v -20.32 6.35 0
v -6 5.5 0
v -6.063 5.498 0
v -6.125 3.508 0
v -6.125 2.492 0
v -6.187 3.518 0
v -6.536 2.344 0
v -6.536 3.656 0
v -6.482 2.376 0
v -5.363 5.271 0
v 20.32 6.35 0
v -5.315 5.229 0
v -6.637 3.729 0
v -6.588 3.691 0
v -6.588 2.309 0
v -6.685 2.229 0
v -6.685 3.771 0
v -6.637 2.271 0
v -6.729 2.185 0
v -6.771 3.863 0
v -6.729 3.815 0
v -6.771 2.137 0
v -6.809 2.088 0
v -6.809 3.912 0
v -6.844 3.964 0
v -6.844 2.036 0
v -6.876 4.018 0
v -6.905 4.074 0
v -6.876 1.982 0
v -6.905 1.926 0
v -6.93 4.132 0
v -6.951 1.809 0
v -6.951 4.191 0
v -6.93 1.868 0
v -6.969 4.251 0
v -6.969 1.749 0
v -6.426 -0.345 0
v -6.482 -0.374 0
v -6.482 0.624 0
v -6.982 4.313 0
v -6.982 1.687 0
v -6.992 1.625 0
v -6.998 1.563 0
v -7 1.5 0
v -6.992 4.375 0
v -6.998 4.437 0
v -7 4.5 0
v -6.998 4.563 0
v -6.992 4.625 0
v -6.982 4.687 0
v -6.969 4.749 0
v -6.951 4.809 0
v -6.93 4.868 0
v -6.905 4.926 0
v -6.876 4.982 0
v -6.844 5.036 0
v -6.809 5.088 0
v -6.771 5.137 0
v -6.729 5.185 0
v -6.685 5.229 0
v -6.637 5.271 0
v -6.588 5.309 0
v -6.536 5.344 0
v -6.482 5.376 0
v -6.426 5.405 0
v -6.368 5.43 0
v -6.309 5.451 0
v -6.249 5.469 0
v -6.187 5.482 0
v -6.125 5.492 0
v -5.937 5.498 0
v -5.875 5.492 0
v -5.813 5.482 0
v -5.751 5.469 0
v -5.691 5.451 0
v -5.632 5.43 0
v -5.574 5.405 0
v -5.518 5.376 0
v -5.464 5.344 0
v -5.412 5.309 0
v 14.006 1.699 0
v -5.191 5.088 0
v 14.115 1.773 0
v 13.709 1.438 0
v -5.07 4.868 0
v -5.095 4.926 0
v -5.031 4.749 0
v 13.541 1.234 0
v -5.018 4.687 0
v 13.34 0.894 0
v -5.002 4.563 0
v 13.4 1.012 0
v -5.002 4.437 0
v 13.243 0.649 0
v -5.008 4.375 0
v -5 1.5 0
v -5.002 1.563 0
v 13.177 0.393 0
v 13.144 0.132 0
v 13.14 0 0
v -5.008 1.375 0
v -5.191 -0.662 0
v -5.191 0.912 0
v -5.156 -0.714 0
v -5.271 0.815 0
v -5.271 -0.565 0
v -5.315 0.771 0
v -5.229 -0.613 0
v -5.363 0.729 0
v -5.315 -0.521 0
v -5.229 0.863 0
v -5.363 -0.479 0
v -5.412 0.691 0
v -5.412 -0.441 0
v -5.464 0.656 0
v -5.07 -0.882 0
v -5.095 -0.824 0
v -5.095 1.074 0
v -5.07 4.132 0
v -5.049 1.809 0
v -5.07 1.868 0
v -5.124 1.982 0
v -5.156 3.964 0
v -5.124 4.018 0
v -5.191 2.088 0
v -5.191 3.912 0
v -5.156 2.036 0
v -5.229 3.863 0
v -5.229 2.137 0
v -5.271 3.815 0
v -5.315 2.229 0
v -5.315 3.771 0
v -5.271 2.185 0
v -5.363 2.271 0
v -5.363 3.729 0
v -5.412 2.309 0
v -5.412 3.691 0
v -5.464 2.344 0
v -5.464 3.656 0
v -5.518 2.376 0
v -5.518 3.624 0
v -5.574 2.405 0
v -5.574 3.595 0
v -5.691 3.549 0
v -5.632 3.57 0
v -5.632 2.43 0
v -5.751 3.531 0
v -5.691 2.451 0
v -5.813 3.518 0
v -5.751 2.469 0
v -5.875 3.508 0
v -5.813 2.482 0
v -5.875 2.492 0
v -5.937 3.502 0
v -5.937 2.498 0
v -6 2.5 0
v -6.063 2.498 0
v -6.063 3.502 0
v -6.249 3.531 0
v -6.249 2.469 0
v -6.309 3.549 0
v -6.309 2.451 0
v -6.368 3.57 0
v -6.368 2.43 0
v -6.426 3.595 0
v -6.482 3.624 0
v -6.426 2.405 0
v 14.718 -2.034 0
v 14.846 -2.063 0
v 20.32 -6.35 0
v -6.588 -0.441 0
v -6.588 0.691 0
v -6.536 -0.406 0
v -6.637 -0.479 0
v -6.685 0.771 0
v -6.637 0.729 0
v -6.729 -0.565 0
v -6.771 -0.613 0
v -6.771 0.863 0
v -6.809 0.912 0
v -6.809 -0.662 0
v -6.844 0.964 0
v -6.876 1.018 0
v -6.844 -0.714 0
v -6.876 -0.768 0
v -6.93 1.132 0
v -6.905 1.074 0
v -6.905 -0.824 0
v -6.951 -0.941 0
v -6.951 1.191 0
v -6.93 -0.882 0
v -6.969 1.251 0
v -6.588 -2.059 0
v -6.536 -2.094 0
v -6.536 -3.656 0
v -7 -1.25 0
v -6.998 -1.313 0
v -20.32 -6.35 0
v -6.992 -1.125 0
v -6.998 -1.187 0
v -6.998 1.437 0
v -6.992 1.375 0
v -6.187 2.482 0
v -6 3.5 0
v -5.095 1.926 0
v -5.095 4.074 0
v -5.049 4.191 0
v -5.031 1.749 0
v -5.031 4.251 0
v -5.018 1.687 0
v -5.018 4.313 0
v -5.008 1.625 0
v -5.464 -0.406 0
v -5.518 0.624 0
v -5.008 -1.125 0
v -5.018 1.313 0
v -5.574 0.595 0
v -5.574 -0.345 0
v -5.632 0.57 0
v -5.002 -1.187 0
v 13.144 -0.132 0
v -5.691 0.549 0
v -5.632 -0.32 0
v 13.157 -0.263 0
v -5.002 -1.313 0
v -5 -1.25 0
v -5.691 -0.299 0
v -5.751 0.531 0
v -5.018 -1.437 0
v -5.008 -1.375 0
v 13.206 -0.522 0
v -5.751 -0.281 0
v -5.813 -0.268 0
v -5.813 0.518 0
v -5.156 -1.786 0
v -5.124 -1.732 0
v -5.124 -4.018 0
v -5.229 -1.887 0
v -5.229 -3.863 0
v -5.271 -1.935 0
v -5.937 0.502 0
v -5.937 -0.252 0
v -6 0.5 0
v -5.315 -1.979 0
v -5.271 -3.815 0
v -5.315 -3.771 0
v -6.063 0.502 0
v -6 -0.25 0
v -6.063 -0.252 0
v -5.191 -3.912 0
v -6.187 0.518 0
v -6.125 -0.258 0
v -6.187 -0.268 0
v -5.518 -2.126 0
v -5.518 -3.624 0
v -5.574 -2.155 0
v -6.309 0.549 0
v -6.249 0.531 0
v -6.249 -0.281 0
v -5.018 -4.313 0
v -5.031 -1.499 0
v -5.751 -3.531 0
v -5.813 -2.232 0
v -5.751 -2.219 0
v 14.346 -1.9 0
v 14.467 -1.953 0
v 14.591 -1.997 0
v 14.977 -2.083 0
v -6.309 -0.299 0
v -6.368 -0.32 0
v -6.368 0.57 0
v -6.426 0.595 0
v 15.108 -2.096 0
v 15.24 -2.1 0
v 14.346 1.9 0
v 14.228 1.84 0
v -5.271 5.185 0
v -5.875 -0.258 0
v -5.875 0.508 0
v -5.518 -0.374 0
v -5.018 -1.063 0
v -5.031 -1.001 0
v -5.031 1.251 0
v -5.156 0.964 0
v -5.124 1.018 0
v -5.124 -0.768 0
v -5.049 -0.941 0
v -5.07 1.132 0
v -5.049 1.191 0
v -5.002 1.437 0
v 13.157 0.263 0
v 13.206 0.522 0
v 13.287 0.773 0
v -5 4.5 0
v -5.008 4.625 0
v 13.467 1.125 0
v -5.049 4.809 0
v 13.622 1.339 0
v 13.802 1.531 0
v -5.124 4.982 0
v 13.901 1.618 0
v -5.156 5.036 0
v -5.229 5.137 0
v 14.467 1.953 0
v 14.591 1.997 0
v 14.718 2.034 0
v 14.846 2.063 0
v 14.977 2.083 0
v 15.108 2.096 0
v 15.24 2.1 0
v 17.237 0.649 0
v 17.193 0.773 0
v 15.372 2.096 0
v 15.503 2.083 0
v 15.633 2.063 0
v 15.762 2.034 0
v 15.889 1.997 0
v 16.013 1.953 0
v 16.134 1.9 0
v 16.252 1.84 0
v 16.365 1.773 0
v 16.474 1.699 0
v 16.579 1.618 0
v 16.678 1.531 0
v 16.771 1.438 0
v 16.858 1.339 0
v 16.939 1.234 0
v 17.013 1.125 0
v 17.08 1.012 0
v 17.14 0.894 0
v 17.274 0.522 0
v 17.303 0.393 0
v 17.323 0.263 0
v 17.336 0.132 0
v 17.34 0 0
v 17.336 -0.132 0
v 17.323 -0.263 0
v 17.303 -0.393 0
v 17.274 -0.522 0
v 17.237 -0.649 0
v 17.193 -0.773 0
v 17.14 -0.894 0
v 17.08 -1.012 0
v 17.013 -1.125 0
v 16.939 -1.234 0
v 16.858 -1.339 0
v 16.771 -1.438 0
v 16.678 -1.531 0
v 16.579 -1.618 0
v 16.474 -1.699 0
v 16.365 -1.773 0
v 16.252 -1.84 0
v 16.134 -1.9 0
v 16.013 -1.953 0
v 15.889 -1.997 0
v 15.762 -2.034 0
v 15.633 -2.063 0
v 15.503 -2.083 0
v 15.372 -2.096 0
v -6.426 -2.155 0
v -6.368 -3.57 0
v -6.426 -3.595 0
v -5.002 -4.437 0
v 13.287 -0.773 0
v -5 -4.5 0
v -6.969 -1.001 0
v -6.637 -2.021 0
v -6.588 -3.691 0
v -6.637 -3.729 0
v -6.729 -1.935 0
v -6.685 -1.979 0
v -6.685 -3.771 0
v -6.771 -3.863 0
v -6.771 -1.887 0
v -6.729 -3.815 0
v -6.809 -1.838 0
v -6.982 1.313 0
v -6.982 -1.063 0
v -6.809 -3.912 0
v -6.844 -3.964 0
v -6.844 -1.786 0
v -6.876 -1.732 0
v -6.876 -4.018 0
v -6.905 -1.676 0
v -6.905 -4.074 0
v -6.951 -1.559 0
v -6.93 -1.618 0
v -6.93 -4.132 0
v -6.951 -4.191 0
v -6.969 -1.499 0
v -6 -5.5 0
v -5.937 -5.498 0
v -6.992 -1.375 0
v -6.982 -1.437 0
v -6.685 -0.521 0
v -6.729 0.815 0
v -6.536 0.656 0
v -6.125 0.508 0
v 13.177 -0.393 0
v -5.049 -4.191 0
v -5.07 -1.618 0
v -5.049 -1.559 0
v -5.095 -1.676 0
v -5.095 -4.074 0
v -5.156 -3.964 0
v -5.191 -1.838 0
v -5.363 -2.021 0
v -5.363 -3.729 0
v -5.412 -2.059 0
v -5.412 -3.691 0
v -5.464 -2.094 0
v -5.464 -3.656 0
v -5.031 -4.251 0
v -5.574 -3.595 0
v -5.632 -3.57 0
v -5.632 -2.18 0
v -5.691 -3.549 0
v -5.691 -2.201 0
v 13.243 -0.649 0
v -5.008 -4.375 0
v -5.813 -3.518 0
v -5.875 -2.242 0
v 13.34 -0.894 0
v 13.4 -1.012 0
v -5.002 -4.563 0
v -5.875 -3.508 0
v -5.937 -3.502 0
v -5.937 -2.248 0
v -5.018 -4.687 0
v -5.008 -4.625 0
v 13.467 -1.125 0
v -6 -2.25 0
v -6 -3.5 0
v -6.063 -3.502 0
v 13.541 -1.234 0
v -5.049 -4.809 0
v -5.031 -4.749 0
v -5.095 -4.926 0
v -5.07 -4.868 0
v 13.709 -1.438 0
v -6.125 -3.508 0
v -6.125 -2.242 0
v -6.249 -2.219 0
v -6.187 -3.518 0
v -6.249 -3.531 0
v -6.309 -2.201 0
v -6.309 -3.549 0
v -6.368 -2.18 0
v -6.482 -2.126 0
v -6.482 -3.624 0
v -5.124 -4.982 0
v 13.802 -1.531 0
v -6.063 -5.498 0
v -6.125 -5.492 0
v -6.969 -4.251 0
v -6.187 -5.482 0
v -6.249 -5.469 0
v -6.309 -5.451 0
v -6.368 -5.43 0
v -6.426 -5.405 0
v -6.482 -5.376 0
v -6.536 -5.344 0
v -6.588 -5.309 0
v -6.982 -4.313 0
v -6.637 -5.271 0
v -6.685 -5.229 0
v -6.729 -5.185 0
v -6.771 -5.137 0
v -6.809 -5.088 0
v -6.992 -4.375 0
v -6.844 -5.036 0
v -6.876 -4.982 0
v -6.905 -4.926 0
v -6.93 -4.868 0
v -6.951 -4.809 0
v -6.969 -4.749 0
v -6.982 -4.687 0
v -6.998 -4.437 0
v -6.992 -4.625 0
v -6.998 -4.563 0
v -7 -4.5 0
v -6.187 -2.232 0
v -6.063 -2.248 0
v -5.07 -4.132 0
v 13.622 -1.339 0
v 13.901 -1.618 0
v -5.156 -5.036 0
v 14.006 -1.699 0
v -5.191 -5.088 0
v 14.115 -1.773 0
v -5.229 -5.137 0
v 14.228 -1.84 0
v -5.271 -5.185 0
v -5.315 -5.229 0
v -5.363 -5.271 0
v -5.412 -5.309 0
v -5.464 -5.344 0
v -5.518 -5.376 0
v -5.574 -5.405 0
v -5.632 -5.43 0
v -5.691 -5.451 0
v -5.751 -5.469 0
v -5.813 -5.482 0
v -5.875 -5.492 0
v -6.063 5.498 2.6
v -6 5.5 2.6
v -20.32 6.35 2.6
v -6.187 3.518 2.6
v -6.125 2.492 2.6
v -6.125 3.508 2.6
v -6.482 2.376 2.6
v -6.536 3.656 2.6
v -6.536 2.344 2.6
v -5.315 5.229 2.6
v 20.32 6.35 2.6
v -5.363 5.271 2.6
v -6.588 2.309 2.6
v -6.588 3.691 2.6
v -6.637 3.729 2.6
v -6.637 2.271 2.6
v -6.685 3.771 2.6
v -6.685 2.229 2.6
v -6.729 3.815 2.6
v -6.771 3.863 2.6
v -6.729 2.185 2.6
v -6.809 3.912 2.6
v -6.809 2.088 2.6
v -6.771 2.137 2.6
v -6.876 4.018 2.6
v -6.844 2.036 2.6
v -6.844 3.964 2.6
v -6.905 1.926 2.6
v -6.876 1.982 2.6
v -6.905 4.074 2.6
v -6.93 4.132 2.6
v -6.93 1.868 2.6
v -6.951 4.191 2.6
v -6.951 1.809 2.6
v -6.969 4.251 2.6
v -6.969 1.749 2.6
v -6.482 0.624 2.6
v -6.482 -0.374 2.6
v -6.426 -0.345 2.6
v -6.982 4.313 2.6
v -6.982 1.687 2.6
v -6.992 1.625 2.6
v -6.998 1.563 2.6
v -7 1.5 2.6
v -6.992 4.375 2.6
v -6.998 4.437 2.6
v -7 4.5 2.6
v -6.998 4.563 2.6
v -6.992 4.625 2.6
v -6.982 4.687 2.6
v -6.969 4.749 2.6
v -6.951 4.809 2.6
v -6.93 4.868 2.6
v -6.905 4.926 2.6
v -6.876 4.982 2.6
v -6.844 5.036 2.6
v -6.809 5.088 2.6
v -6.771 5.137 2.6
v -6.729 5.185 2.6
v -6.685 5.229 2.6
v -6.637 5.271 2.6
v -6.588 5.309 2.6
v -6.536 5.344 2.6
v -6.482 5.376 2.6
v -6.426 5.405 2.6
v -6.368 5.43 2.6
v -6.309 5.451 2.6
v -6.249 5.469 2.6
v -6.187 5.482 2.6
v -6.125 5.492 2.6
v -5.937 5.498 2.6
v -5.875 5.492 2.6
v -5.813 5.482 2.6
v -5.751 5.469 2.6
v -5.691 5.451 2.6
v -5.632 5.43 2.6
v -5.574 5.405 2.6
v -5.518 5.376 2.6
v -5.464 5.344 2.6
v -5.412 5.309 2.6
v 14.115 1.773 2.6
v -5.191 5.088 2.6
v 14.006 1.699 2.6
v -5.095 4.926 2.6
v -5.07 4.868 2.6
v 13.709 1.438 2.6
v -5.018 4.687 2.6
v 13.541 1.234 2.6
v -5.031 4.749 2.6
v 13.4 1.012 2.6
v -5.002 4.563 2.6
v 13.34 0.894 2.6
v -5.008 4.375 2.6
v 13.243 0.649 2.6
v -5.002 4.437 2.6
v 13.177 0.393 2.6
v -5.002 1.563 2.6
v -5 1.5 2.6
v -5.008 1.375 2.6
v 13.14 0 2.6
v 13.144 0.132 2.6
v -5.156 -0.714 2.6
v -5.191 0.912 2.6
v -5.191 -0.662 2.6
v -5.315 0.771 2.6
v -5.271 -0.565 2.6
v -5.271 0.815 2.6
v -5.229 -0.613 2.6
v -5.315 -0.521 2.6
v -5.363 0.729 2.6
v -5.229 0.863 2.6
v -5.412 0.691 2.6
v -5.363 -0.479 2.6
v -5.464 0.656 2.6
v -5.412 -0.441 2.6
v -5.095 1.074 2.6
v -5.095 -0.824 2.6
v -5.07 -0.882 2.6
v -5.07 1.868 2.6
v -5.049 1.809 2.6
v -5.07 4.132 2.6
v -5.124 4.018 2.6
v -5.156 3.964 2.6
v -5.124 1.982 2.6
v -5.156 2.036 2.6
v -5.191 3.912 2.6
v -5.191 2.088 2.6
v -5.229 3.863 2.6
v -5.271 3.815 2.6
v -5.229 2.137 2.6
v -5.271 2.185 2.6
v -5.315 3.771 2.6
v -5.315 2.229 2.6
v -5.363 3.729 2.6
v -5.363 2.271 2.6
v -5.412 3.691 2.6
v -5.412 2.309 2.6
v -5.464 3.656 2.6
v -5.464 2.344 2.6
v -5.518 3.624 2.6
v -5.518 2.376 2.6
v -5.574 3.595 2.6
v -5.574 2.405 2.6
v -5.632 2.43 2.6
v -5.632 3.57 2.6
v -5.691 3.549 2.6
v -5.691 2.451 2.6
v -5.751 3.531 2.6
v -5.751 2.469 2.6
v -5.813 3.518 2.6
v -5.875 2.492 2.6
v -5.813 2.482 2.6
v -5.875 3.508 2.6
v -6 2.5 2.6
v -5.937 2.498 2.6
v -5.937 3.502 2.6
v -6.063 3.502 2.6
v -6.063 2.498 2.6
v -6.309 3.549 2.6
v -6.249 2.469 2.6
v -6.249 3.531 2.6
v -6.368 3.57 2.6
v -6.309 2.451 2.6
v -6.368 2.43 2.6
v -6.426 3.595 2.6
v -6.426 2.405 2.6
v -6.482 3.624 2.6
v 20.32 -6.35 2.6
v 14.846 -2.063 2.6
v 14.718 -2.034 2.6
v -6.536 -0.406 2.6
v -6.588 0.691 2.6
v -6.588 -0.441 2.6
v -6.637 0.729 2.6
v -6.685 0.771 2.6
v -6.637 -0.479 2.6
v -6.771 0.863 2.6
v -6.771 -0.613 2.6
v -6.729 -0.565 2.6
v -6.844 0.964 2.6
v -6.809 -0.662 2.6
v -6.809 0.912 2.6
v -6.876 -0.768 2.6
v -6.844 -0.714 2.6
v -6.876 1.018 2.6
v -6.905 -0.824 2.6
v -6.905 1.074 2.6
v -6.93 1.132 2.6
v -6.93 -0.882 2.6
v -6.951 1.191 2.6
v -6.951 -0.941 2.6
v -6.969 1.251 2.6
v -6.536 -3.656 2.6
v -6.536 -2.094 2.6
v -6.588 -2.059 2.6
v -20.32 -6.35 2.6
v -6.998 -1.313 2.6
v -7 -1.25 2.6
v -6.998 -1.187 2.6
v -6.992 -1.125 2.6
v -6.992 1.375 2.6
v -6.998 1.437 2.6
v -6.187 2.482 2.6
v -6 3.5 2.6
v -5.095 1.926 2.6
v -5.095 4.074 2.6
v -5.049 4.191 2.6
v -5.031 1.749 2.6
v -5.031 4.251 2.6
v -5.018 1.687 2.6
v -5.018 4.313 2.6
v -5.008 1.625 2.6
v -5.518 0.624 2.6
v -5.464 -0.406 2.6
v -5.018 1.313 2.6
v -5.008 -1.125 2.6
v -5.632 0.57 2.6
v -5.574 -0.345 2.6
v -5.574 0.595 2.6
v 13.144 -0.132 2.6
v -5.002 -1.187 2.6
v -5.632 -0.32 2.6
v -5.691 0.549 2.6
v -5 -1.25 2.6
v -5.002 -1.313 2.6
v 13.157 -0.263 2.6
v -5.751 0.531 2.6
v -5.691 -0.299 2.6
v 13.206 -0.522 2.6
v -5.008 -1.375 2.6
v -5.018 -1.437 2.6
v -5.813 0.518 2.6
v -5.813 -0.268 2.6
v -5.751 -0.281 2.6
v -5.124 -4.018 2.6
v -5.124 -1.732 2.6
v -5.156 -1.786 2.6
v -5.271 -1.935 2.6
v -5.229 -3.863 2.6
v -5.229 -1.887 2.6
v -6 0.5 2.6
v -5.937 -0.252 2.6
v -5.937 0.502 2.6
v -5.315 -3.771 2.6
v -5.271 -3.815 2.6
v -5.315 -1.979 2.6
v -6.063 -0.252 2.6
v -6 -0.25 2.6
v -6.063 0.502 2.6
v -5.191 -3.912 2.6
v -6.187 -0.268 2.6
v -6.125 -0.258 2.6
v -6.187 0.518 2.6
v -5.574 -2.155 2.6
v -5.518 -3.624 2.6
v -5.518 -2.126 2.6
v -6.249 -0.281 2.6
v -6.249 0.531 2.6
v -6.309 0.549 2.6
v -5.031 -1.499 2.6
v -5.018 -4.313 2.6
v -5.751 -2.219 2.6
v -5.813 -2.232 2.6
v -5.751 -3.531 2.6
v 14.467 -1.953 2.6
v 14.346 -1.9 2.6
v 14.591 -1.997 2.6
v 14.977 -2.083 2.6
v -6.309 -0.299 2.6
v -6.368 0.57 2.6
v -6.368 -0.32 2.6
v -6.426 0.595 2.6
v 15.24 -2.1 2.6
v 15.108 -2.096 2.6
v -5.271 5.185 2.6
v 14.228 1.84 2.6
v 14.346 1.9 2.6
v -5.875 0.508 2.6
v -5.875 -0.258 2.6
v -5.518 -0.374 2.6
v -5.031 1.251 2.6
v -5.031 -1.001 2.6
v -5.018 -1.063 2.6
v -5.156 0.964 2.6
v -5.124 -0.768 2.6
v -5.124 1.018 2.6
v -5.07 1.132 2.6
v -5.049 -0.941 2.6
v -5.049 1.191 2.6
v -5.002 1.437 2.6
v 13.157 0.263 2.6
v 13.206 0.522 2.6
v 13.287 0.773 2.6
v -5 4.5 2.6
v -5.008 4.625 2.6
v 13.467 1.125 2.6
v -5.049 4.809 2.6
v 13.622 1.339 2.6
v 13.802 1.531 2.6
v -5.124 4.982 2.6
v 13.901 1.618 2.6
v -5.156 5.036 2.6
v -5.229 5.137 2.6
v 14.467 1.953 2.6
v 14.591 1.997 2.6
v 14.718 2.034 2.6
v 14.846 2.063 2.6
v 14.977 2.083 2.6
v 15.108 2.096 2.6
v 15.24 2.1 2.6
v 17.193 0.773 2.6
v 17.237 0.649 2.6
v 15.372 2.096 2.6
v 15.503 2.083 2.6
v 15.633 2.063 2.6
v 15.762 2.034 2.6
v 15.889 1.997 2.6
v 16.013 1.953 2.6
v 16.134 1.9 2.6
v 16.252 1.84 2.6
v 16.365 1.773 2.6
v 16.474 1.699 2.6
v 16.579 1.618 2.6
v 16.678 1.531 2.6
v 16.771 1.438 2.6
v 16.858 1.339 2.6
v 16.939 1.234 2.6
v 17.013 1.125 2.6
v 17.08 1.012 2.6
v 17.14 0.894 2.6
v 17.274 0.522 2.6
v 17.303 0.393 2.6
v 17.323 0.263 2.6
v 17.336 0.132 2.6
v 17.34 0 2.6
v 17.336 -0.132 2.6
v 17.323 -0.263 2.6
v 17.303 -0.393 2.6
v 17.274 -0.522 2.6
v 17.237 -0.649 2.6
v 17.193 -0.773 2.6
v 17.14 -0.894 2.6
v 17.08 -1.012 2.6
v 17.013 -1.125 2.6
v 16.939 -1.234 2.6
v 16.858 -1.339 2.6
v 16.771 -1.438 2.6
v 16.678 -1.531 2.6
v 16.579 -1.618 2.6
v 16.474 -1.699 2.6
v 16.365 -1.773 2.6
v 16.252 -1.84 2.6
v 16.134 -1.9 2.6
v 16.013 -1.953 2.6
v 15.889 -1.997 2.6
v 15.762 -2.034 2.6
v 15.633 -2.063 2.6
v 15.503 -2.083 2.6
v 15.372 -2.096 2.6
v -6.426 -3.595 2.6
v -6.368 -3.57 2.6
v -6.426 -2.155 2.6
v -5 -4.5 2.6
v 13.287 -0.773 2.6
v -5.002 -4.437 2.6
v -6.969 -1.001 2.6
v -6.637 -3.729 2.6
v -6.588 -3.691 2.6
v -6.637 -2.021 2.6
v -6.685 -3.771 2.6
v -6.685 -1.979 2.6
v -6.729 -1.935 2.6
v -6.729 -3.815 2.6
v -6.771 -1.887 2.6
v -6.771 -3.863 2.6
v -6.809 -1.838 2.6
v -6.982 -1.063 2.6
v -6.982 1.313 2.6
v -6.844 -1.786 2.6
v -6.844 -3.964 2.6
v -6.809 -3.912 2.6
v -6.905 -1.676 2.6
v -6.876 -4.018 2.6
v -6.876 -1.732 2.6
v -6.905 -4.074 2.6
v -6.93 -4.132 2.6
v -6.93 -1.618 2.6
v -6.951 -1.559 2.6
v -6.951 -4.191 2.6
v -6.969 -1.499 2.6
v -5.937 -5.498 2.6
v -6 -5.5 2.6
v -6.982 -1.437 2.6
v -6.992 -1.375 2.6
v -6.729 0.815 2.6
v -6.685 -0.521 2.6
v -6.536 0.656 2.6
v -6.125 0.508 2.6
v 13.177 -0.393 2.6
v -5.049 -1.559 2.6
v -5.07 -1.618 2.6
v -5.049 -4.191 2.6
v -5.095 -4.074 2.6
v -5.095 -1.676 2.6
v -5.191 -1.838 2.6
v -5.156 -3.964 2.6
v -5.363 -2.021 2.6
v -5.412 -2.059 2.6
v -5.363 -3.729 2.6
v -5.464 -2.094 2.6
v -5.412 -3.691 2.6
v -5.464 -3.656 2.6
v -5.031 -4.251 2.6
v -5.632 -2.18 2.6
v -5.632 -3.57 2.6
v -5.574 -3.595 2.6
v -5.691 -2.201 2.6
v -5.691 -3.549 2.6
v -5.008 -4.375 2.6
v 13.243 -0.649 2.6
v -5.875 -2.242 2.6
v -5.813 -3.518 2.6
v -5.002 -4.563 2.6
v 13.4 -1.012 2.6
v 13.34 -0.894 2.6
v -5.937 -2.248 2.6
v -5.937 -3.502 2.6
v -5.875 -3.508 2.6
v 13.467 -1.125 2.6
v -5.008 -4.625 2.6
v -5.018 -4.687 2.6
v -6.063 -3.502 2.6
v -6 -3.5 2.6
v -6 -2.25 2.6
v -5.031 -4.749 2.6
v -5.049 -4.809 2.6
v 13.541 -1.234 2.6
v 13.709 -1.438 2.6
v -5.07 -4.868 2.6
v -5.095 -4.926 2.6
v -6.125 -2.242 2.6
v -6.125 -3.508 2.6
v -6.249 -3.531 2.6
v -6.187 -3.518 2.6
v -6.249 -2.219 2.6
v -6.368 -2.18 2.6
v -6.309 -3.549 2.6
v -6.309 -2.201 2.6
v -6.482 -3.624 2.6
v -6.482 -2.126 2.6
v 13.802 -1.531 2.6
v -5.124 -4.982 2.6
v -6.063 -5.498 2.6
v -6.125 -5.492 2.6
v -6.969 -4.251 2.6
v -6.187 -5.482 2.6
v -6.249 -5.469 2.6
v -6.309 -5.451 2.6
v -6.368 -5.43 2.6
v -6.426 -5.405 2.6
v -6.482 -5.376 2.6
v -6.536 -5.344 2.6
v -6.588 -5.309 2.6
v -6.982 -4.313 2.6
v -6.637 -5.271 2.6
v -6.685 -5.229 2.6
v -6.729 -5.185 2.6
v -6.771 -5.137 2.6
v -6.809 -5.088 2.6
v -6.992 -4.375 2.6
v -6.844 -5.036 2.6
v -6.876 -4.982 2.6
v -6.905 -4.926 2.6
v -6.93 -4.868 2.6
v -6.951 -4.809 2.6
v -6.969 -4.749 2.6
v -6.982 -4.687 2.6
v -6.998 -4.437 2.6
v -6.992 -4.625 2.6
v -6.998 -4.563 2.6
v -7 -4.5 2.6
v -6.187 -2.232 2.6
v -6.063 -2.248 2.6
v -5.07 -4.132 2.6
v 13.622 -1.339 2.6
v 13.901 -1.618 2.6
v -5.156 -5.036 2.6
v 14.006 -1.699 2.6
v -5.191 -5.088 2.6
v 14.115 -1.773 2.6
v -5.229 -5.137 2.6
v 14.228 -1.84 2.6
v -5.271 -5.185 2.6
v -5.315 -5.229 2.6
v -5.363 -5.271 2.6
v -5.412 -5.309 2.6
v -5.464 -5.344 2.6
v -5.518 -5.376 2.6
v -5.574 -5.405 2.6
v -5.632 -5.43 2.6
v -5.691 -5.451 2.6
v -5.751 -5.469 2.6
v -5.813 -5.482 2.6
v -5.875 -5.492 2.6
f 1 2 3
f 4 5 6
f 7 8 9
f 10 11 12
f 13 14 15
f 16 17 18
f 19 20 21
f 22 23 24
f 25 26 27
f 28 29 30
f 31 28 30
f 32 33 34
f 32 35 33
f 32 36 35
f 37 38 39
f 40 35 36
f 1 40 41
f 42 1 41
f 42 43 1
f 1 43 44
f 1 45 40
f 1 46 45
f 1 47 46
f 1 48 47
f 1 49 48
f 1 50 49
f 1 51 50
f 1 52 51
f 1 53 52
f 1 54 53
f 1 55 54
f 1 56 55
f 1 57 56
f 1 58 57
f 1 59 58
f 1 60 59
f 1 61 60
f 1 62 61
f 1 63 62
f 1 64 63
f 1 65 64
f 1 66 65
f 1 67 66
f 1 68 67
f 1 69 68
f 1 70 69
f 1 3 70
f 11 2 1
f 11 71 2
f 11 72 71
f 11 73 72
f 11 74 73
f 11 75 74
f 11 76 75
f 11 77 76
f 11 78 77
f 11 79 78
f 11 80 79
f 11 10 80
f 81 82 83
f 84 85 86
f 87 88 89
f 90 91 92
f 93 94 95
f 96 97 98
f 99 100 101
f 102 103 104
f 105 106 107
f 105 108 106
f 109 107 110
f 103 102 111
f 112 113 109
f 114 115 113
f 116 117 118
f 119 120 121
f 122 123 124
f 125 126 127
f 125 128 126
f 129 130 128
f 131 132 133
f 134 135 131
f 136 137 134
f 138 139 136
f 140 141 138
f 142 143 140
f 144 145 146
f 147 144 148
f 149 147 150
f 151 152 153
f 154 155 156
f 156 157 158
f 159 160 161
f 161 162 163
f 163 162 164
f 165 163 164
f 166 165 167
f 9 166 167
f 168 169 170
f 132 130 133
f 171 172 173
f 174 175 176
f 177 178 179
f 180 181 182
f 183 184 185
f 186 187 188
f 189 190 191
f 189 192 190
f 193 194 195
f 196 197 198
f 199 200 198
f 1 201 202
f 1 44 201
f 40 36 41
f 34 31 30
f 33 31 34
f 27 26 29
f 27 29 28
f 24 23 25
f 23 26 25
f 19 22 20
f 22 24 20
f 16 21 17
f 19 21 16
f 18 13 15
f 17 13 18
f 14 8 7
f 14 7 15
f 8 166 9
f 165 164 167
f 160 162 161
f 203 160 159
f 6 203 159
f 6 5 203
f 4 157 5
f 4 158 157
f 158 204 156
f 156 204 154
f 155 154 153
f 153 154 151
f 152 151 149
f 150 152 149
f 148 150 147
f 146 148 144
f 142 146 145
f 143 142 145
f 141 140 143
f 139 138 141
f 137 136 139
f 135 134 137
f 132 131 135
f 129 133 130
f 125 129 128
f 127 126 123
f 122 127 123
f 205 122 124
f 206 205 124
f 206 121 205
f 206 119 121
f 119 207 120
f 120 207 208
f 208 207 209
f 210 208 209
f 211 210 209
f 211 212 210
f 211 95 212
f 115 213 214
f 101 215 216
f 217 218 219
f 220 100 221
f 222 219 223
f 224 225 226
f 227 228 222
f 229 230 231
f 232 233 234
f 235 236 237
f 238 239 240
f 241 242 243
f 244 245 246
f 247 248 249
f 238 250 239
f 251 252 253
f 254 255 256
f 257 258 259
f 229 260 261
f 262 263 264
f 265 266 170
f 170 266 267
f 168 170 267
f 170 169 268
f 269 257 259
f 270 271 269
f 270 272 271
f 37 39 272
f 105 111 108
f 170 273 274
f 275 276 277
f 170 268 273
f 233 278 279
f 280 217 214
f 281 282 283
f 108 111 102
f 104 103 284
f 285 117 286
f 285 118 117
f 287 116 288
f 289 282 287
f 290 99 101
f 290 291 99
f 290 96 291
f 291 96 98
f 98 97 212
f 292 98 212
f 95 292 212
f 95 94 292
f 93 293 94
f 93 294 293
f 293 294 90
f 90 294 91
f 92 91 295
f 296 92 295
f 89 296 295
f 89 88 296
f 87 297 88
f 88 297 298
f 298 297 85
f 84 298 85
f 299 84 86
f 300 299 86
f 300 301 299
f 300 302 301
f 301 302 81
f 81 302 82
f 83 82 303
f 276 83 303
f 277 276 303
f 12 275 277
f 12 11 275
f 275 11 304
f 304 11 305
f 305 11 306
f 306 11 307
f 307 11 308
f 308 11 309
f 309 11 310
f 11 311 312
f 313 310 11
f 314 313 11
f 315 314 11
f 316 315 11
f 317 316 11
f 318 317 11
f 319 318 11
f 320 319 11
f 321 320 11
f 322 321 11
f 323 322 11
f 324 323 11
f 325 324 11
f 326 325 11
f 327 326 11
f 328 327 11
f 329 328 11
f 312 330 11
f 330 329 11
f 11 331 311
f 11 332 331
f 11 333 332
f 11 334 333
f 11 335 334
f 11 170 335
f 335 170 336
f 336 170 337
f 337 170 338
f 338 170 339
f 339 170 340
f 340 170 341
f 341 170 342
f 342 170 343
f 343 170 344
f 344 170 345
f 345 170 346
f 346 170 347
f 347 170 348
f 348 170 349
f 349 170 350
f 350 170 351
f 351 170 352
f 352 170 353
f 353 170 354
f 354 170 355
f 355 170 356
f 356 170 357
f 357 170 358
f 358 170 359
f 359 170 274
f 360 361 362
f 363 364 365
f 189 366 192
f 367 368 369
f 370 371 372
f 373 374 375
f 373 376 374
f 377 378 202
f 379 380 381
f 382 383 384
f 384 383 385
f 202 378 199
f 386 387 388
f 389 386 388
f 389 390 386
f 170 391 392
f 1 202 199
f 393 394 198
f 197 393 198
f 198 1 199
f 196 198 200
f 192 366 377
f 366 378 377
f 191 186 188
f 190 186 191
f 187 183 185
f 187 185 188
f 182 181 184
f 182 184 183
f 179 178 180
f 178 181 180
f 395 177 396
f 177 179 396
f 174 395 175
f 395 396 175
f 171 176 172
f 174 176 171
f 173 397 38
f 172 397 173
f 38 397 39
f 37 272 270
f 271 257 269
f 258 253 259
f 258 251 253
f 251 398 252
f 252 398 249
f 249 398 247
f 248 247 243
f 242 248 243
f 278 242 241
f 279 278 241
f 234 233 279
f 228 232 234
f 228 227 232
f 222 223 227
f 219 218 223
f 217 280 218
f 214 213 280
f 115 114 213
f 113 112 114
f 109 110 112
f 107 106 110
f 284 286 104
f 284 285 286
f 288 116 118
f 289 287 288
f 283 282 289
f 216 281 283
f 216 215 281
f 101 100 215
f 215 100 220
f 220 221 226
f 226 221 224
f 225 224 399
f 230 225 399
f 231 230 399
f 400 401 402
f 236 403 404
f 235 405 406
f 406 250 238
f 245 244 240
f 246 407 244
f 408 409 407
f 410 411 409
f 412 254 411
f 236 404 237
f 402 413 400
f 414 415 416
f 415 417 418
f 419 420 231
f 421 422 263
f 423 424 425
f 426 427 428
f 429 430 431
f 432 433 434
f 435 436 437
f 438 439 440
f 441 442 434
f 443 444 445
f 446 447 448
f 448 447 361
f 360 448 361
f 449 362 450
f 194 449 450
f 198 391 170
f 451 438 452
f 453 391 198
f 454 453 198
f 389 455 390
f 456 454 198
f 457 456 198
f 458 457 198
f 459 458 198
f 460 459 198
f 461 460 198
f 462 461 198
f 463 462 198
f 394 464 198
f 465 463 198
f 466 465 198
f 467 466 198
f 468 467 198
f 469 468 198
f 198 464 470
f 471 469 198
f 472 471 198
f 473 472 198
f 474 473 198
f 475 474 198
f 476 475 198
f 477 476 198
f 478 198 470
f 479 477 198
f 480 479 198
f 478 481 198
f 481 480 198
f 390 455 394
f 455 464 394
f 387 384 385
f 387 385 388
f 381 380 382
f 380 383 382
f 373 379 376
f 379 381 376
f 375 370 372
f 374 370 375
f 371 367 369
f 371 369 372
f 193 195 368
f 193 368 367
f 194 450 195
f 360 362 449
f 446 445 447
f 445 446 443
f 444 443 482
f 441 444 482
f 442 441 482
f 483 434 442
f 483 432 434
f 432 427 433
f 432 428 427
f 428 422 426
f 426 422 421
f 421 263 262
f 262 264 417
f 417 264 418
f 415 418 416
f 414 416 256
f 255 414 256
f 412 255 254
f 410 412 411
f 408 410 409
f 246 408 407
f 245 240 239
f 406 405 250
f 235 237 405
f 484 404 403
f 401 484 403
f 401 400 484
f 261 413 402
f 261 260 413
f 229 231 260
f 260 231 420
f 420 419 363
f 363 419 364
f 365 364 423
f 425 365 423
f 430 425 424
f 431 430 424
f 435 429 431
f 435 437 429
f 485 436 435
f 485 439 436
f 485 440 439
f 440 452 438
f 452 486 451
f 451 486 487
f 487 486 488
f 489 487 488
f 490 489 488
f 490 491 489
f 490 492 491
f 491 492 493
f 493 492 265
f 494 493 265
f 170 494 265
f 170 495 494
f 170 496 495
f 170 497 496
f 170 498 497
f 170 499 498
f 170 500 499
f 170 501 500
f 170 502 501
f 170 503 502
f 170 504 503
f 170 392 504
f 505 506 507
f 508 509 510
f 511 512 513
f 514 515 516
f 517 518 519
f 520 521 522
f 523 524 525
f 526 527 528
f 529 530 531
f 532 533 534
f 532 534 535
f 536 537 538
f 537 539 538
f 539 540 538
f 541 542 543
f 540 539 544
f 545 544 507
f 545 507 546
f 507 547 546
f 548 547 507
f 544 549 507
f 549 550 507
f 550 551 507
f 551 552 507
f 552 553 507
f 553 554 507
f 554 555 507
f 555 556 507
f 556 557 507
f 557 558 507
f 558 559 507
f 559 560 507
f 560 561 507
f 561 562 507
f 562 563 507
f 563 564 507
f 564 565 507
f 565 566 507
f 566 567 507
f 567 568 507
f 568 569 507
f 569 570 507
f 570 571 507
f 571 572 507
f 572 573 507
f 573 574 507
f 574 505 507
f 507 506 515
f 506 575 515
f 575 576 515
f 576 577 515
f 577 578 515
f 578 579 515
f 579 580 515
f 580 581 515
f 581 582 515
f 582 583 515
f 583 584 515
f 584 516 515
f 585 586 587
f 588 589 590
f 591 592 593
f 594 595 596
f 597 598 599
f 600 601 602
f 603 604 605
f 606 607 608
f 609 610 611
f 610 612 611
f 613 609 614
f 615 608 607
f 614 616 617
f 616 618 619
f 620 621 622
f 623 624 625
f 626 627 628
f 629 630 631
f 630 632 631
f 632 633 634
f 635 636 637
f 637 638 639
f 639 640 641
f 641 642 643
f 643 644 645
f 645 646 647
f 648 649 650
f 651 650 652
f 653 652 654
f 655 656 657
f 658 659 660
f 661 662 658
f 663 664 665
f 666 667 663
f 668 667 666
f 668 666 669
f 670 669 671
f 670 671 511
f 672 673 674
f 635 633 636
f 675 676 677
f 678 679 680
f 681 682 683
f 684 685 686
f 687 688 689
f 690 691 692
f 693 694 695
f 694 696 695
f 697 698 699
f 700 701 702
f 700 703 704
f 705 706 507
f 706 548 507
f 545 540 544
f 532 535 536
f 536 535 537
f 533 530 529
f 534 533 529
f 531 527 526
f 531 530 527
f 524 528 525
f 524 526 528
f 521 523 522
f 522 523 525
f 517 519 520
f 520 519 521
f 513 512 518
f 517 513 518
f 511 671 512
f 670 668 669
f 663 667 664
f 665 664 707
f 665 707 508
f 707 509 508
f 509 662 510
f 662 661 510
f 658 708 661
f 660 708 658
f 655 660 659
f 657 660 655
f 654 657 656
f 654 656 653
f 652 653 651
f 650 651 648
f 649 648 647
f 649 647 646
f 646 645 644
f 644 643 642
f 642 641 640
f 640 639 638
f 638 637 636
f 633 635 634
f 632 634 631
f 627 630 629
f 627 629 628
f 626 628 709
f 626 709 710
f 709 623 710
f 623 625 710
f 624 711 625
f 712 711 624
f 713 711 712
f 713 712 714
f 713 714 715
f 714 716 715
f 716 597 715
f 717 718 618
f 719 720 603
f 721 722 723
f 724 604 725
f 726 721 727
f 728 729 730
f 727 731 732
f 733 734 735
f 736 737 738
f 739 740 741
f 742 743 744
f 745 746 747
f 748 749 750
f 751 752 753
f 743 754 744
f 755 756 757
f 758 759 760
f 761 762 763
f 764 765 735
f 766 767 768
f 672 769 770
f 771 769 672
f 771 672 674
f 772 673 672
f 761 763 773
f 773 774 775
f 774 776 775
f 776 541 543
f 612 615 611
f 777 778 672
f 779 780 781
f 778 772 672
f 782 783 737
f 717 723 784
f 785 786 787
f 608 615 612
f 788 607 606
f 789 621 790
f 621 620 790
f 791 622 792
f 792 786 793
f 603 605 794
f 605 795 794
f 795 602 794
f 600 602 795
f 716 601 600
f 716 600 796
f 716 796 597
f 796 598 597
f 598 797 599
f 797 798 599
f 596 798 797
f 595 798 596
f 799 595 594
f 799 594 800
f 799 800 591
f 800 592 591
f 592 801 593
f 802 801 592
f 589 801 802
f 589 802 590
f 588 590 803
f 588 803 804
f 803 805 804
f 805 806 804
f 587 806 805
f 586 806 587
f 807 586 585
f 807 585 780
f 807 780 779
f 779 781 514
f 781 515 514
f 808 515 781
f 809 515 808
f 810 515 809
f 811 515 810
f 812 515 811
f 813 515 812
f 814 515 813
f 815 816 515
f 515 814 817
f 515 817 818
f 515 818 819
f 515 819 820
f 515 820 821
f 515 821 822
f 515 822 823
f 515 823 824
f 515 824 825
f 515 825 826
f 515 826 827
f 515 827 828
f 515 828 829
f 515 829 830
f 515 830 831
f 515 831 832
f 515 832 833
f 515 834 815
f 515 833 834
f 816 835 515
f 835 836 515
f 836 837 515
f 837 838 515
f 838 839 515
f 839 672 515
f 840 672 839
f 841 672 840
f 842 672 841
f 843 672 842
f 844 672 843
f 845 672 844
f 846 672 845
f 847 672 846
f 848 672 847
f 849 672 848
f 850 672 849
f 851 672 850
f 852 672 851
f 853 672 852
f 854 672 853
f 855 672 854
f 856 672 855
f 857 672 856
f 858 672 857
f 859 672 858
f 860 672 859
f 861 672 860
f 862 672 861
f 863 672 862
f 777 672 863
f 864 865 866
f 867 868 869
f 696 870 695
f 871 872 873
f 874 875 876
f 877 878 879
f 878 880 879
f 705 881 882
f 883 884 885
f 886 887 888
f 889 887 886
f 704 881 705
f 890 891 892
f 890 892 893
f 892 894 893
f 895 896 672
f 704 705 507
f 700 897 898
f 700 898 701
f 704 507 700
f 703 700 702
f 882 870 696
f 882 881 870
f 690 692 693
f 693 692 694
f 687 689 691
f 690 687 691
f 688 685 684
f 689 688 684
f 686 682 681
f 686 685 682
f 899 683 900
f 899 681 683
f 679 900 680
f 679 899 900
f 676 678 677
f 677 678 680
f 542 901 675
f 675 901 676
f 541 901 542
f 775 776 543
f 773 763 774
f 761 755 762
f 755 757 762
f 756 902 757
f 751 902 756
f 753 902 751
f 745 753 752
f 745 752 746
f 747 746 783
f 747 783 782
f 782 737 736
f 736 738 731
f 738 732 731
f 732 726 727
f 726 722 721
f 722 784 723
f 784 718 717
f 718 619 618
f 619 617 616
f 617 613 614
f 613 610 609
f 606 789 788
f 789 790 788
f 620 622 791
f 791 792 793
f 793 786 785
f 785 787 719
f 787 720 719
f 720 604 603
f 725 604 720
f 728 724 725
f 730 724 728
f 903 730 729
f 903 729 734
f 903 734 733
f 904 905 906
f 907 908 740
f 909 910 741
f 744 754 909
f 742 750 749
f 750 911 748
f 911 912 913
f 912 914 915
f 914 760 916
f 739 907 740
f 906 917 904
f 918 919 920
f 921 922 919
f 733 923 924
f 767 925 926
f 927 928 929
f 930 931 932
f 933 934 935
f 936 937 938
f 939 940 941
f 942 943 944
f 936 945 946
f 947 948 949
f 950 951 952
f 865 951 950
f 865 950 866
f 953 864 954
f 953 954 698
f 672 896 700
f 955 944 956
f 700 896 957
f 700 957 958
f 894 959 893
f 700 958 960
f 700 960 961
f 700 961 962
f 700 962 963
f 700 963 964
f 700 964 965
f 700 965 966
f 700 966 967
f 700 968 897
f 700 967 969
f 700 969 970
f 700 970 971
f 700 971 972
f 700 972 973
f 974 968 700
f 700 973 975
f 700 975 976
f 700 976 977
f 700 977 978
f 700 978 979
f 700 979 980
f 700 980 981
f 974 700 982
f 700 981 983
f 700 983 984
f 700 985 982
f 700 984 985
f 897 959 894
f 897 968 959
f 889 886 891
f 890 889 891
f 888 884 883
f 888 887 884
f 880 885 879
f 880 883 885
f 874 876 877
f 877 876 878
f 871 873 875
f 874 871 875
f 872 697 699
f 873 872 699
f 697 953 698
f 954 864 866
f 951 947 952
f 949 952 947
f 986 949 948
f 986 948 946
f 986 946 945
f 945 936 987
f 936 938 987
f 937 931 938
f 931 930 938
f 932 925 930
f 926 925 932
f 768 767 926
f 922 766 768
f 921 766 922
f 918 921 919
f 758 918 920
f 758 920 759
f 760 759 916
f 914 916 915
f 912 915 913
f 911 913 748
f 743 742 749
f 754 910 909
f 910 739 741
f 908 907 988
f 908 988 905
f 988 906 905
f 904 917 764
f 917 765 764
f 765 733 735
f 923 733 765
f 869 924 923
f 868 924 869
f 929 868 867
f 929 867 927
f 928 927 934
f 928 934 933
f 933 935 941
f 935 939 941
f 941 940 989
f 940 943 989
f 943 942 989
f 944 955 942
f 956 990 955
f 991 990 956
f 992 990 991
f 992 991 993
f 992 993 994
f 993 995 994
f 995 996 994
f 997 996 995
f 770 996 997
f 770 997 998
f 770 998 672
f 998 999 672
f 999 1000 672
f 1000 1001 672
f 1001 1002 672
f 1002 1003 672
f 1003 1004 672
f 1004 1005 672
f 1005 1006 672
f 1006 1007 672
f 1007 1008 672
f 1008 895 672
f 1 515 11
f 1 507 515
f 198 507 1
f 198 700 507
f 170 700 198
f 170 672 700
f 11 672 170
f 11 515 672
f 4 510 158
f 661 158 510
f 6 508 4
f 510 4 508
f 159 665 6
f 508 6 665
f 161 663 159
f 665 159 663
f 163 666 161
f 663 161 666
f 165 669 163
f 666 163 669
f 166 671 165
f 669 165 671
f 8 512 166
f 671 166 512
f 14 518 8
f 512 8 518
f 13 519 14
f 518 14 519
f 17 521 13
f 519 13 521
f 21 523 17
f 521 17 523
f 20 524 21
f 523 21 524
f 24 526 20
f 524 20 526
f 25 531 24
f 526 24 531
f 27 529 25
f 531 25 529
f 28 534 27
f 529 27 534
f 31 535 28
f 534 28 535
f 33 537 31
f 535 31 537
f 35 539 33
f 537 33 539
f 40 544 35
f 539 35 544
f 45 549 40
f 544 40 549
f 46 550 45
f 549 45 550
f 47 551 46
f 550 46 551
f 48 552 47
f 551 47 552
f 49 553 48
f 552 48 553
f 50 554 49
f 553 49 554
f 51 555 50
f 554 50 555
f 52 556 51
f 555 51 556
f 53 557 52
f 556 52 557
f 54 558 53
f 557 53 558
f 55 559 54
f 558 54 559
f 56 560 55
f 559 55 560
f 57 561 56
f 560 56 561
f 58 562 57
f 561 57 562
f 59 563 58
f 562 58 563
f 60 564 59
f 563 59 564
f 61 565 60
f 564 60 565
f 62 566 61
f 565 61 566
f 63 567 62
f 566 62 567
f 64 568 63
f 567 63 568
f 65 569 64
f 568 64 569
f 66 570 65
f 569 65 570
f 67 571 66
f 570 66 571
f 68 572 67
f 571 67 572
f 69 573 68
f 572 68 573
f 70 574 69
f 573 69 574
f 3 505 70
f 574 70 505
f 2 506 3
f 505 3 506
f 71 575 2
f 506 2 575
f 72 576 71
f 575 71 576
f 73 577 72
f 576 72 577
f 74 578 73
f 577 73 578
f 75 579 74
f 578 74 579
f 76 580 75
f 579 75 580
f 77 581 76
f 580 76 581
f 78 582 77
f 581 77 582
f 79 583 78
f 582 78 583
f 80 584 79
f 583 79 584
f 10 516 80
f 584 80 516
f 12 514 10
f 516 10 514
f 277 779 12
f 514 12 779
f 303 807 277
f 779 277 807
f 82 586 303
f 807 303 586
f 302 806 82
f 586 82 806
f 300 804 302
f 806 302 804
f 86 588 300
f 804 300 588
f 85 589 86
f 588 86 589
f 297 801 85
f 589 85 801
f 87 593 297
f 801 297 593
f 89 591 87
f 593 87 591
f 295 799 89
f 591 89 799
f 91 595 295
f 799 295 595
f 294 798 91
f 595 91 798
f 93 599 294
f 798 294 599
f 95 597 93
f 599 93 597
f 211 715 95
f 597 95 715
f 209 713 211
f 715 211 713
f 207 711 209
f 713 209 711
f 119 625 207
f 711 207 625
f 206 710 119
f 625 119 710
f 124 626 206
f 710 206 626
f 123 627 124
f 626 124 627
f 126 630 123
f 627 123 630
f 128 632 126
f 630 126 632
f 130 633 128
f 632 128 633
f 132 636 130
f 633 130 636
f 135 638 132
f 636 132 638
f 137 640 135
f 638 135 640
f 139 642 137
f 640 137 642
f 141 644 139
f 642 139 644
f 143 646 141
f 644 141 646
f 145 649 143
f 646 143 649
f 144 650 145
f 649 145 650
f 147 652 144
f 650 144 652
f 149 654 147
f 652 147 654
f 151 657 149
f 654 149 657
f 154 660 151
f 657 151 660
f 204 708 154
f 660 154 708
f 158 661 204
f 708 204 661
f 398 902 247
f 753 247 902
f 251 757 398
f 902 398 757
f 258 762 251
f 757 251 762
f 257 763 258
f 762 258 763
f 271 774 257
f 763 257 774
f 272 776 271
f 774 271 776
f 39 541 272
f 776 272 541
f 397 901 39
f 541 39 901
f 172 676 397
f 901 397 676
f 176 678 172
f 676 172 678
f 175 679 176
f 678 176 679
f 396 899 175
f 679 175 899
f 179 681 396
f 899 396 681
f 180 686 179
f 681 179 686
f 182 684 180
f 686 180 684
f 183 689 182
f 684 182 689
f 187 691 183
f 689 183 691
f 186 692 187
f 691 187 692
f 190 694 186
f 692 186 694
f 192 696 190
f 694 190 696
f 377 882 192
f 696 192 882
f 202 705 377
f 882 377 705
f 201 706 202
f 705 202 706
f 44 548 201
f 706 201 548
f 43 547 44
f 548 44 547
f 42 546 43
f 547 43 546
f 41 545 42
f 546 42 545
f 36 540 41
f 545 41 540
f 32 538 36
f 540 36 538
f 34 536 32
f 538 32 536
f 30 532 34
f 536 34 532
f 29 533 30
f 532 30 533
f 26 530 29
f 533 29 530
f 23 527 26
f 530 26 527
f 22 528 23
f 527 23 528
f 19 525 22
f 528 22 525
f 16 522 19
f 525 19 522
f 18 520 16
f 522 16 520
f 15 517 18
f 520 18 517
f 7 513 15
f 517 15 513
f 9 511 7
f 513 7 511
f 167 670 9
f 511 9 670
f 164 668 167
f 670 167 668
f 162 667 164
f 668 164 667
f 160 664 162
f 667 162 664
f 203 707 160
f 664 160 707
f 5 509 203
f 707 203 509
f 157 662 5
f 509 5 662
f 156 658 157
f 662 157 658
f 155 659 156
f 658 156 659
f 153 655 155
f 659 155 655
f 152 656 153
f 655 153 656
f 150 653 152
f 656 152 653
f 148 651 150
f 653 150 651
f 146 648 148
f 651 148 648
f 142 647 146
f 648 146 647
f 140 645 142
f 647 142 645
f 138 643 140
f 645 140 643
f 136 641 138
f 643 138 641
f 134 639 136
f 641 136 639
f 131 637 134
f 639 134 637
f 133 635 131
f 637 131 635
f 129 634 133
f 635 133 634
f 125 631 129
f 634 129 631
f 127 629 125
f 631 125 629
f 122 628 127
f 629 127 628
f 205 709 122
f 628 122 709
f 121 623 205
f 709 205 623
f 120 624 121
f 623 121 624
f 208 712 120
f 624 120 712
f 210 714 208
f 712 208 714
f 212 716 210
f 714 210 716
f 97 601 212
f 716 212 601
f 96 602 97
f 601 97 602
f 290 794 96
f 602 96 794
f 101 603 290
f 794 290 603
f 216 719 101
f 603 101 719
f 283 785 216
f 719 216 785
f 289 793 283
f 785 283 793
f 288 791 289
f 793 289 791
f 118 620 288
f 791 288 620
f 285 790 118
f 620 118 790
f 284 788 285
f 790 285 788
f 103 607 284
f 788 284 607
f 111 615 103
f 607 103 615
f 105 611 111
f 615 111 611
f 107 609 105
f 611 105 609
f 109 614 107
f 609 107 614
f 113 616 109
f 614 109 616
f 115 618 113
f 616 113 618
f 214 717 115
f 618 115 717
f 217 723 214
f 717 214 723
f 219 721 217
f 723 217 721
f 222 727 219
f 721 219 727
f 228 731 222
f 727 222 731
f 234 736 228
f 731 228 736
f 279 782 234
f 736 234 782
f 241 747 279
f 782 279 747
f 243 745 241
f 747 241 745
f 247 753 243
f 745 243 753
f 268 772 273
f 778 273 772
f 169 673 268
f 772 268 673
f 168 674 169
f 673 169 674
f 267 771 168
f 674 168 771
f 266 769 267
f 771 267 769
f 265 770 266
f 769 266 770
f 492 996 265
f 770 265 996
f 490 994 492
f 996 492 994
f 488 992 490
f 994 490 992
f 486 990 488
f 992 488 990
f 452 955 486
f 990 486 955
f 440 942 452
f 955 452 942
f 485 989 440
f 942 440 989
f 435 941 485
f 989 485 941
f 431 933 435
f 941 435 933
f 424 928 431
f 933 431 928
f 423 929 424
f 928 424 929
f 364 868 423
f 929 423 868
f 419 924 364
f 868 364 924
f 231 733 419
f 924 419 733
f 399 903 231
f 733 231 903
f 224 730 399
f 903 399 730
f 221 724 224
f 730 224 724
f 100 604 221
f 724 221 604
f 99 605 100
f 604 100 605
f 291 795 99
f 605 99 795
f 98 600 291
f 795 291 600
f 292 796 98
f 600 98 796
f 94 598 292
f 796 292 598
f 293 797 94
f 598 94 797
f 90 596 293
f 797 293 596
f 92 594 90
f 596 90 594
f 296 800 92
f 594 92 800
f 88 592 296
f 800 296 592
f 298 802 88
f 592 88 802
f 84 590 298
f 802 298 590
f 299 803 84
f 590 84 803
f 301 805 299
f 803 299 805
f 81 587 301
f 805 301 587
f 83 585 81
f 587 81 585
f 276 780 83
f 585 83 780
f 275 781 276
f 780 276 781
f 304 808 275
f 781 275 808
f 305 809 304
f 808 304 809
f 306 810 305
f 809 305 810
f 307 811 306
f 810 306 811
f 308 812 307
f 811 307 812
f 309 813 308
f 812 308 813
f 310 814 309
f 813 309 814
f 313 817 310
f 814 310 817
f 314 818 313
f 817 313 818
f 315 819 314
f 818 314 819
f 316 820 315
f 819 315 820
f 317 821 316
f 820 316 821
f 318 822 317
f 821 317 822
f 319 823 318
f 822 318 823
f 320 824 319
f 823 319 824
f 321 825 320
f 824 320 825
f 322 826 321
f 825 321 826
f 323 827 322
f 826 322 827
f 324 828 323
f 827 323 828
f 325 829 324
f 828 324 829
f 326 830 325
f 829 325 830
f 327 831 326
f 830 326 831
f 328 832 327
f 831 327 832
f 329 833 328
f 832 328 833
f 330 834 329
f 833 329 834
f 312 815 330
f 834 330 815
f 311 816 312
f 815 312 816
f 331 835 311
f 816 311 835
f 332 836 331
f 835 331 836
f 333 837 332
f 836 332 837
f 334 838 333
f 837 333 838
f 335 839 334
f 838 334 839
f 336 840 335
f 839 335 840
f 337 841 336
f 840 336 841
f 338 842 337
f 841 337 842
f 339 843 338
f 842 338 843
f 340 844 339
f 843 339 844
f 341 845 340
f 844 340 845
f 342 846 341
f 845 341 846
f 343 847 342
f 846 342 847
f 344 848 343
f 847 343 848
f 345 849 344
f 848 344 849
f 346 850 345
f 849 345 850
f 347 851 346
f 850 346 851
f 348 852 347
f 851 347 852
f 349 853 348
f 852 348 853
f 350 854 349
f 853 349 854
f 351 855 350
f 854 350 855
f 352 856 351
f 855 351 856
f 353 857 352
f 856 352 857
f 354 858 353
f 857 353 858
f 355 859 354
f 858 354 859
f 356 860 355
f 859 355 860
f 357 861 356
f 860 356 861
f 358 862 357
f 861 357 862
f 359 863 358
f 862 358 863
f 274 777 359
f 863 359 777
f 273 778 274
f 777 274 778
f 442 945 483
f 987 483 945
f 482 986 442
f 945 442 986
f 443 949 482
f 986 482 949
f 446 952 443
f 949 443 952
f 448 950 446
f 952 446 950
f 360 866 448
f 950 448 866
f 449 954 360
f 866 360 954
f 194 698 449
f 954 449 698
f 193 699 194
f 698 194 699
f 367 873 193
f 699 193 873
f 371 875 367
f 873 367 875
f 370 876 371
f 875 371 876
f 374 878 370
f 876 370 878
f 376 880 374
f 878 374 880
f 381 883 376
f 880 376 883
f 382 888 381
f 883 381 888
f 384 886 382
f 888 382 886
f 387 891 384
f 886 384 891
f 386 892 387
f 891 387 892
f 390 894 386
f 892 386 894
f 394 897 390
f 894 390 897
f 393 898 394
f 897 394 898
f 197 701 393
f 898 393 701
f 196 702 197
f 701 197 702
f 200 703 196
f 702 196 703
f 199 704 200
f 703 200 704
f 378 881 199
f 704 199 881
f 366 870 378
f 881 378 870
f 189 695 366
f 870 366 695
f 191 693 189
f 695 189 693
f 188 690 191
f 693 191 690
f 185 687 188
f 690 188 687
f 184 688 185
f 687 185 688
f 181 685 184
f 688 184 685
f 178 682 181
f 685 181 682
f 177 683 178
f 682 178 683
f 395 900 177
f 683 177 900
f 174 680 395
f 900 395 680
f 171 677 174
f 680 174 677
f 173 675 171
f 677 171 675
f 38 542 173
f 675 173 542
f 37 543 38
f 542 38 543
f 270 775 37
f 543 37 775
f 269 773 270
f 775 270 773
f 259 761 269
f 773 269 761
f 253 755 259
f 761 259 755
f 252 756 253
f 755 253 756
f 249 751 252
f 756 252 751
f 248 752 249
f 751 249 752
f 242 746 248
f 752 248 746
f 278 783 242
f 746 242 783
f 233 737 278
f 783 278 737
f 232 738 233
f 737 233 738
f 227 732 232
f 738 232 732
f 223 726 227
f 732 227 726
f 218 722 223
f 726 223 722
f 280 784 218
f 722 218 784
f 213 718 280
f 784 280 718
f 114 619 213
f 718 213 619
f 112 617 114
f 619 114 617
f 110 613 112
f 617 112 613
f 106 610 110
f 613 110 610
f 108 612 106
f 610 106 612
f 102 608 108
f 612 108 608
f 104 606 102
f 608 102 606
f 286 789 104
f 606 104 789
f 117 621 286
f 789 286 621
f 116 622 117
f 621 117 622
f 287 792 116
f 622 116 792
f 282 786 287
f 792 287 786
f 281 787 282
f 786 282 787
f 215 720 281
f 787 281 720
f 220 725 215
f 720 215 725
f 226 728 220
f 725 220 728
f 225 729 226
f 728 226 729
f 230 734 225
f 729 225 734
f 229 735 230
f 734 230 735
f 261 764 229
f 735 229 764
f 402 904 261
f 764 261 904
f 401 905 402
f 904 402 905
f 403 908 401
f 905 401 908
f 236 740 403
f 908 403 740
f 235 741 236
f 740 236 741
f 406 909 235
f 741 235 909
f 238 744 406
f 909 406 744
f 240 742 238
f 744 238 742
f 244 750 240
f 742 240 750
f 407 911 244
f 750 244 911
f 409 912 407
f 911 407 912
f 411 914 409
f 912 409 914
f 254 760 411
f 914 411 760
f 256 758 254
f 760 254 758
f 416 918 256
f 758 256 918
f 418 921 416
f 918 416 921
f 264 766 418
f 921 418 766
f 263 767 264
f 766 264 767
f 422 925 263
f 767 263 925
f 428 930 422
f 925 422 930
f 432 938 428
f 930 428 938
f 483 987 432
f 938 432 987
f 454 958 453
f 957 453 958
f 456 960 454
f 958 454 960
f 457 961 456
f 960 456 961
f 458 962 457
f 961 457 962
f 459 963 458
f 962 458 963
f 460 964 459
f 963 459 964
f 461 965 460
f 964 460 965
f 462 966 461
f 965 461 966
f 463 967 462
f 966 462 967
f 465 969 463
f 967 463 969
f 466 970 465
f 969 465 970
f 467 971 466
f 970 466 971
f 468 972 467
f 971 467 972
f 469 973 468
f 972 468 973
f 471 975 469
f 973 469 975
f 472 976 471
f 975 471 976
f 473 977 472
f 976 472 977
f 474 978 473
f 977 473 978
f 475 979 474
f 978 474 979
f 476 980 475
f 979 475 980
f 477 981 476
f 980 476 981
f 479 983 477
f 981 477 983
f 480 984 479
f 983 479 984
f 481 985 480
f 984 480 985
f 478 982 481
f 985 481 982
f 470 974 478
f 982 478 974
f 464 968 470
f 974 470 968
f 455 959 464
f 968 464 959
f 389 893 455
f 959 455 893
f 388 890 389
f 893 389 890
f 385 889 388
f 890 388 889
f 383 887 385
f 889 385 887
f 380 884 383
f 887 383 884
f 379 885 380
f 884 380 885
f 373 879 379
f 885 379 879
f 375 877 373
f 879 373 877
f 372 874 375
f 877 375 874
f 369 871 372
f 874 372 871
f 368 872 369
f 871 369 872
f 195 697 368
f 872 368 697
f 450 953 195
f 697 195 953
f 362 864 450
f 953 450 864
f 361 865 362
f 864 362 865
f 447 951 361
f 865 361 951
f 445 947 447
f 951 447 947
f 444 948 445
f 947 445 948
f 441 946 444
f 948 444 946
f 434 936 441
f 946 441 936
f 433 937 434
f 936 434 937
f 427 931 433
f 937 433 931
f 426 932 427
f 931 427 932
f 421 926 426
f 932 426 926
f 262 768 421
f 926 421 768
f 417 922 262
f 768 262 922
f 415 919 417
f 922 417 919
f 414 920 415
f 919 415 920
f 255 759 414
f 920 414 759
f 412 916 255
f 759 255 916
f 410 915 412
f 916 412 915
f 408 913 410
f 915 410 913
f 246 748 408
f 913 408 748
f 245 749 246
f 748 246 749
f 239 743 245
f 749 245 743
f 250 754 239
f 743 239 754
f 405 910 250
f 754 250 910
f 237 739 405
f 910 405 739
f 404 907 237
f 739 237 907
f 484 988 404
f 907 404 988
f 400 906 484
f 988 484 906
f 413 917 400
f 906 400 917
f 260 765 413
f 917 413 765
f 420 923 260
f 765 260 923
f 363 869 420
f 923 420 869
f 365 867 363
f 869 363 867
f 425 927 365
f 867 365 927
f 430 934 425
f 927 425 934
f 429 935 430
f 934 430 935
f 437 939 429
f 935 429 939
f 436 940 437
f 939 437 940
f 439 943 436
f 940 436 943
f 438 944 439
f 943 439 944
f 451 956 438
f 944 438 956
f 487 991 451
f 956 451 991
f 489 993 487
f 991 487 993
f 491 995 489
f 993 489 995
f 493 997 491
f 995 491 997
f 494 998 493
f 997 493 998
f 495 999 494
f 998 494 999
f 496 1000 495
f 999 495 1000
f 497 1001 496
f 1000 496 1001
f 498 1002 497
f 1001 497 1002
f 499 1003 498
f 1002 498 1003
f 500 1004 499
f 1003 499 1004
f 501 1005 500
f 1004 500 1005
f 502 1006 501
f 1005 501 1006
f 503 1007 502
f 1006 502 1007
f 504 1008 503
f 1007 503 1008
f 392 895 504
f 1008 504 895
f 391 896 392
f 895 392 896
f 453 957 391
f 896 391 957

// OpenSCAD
pcb_width = 40.64;
pcb_height = 12.7;
pcb_thickness = 2.6;

linear_extrude(pcb_thickness)
difference() {
    // PCB
    square([pcb_width, pcb_height], center=true);
   
    // Mounting hole
    translate([pcb_width/2 -5.08, 0, 0])
    circle(d=4.2, $fn=100);
    
    // LED bores
    translate([-6, 0, 0])
    union() {
        translate([0,-4.5,0])
        circle(d=2, $fn=100);
        
        translate([0,-1.25,0])
        circle(d=2, $fn=100);
        
        translate([0,1.5,0])
        circle(d=2, $fn=100);
        
        translate([0,4.5,0])
        circle(d=2, $fn=100);
    }
}
